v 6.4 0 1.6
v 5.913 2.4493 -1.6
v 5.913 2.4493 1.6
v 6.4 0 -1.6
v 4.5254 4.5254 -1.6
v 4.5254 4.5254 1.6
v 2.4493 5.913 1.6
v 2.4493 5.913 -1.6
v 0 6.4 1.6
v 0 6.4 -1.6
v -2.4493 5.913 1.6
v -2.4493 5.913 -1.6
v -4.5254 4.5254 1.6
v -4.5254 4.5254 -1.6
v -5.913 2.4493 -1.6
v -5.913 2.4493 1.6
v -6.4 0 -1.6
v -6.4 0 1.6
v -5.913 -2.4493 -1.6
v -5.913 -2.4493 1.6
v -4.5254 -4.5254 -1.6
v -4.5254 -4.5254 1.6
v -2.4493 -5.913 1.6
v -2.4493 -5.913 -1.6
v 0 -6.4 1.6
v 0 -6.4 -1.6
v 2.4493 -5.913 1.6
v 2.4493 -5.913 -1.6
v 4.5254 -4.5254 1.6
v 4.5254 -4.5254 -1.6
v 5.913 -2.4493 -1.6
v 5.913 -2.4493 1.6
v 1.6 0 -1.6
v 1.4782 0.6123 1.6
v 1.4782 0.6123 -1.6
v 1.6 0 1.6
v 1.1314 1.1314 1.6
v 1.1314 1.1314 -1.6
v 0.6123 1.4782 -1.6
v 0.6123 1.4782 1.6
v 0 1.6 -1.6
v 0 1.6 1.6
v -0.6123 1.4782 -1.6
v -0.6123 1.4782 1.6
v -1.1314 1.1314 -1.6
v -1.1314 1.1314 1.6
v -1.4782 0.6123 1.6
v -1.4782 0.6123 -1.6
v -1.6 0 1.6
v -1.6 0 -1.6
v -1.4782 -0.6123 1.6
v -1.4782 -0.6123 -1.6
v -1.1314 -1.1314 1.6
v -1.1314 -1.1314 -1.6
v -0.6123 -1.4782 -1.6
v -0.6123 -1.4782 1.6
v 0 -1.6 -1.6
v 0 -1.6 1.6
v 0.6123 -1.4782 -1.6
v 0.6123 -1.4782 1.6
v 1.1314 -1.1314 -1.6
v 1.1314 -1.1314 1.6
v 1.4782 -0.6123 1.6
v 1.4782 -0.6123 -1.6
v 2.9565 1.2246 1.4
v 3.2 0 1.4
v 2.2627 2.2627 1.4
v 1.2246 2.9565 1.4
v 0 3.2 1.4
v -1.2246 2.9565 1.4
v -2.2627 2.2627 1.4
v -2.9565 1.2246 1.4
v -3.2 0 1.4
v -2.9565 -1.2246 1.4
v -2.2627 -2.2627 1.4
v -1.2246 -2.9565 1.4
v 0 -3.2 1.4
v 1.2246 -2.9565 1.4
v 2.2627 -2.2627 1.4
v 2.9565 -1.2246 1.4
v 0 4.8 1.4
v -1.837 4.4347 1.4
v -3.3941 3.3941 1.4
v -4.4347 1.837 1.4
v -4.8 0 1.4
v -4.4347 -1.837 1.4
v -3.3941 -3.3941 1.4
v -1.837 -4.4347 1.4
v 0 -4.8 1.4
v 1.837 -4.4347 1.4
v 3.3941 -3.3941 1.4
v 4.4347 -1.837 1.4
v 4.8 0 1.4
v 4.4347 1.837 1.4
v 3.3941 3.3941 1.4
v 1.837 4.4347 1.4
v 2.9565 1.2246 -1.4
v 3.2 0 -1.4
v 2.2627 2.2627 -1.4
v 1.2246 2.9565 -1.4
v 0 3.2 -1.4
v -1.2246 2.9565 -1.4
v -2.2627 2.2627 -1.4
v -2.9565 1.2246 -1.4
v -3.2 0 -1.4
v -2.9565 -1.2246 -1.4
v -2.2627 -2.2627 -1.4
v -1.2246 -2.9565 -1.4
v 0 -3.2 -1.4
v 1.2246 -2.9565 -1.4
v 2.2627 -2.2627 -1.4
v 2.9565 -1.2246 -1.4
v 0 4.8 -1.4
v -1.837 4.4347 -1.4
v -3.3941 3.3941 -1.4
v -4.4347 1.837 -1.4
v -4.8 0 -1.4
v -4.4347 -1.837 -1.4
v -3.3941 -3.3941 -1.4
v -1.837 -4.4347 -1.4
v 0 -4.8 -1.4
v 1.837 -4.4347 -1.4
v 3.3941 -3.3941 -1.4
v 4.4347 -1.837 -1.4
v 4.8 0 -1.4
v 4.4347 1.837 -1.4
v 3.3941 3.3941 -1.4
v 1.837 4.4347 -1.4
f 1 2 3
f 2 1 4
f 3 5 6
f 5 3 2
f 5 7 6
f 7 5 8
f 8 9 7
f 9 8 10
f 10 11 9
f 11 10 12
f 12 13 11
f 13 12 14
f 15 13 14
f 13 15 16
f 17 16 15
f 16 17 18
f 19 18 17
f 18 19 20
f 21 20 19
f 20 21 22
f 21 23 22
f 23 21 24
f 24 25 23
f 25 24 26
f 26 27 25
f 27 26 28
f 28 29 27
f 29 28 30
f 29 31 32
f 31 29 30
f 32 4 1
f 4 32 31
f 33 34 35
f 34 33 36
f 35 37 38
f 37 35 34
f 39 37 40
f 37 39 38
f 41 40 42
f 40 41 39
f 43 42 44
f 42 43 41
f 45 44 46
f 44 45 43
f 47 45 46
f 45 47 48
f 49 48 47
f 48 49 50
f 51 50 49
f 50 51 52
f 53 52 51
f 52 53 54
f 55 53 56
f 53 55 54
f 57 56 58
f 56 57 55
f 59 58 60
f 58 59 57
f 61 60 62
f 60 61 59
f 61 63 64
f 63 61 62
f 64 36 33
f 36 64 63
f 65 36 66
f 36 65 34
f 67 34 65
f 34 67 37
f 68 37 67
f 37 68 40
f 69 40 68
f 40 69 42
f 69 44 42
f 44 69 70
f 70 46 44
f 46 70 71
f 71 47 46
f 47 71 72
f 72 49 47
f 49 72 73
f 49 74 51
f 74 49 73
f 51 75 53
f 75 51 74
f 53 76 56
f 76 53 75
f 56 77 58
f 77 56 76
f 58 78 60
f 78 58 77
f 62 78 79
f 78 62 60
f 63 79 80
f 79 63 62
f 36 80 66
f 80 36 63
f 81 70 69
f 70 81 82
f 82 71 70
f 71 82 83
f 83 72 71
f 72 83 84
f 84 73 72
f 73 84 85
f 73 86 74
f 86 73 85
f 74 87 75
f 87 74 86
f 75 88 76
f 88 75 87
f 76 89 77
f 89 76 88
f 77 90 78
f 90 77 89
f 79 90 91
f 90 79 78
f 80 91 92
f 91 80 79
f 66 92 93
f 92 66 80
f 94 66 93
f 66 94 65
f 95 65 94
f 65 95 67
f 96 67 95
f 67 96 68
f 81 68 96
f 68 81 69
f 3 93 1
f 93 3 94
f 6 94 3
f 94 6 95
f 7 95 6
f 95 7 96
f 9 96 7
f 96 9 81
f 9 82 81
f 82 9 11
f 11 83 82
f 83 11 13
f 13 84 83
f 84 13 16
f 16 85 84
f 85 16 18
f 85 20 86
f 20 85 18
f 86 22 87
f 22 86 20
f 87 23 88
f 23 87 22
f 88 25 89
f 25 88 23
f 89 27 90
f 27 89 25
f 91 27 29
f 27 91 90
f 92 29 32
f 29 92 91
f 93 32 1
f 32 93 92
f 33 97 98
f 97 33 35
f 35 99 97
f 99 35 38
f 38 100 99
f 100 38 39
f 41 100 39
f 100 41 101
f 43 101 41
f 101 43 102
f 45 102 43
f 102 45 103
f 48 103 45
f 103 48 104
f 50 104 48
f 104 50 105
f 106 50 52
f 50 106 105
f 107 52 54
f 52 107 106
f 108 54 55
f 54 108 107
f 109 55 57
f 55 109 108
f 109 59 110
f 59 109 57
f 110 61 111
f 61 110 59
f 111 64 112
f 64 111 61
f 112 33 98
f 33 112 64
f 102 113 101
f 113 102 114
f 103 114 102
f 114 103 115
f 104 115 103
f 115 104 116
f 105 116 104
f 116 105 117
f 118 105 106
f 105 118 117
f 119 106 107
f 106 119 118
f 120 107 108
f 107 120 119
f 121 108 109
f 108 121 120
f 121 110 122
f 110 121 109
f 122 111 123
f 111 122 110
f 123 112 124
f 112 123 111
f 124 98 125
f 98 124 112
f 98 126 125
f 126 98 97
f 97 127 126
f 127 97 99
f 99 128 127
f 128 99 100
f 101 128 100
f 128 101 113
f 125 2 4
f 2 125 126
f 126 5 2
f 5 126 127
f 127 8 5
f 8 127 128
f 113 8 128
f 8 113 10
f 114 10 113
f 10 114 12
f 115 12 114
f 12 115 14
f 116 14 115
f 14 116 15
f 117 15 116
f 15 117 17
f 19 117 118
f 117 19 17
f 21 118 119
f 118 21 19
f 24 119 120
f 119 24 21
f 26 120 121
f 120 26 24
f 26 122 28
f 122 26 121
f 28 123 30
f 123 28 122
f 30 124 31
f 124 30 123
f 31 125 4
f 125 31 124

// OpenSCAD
// file: ../p/4-4edge.scad
use <../lib.scad>
function ldraw_lib__4_4edge() = [
// 0 Circle 1.0
// 0 Name: 4-4edge.dat
// 0 Author: James Jessiman
// 0 !LDRAW_ORG Primitive UPDATE 2017-01
// 0 !LICENSE Licensed under CC BY 2.0 and CC BY 4.0 : see CAreadme.txt
// 
// 0 BFC CERTIFY CCW
  [0,"BFC","CERTIFY"],
  [0,"BFC","CCW"],
// 
// 0 !HISTORY 1998-12-15 [PTadmin] Official Update 1998-10
// 0 !HISTORY 2005-12-28 [PTadmin] Official Update 2005-01
// 0 !HISTORY 2007-06-24 [PTadmin] Header formatted for Contributor Agreement
// 0 !HISTORY 2008-07-01 [PTadmin] Official Update 2008-01
// 0 !HISTORY 2017-01-15 [Steffen] BFCed
// 0 !HISTORY 2017-12-30 [PTadmin] Official Update 2017-01
// 
// 
// 2 24 1 0 0 0.9239 0 0.3827
  [2,24,1,0,0,0.9239,0,0.3827],
// 2 24 0.9239 0 0.3827 0.7071 0 0.7071
  [2,24,0.9239,0,0.3827,0.7071,0,0.7071],
// 2 24 0.7071 0 0.7071 0.3827 0 0.9239
  [2,24,0.7071,0,0.7071,0.3827,0,0.9239],
// 2 24 0.3827 0 0.9239 0 0 1
  [2,24,0.3827,0,0.9239,0,0,1],
// 2 24 0 0 1 -0.3827 0 0.9239
  [2,24,0,0,1,-0.3827,0,0.9239],
// 2 24 -0.3827 0 0.9239 -0.7071 0 0.7071
  [2,24,-0.3827,0,0.9239,-0.7071,0,0.7071],
// 2 24 -0.7071 0 0.7071 -0.9239 0 0.3827
  [2,24,-0.7071,0,0.7071,-0.9239,0,0.3827],
// 2 24 -0.9239 0 0.3827 -1 0 -0
  [2,24,-0.9239,0,0.3827,-1,0,-0],
// 2 24 -1 0 -0 -0.9239 0 -0.3827
  [2,24,-1,0,-0,-0.9239,0,-0.3827],
// 2 24 -0.9239 0 -0.3827 -0.7071 0 -0.7071
  [2,24,-0.9239,0,-0.3827,-0.7071,0,-0.7071],
// 2 24 -0.7071 0 -0.7071 -0.3827 0 -0.9239
  [2,24,-0.7071,0,-0.7071,-0.3827,0,-0.9239],
// 2 24 -0.3827 0 -0.9239 0 0 -1
  [2,24,-0.3827,0,-0.9239,0,0,-1],
// 2 24 0 0 -1 0.3827 0 -0.9239
  [2,24,0,0,-1,0.3827,0,-0.9239],
// 2 24 0.3827 0 -0.9239 0.7071 0 -0.7071
  [2,24,0.3827,0,-0.9239,0.7071,0,-0.7071],
// 2 24 0.7071 0 -0.7071 0.9239 0 -0.3827
  [2,24,0.7071,0,-0.7071,0.9239,0,-0.3827],
// 2 24 0.9239 0 -0.3827 1 0 0
  [2,24,0.9239,0,-0.3827,1,0,0],
];
module ldraw_lib__4_4edge(step=0, col=false, unit=2/5, alt=false, line=0.2, solid=!$preview)
    makepoly(ldraw_lib__4_4edge(), step=step, col=col, unit=unit, alt=alt, line=line, solid=solid);
ldraw_lib__4_4edge(line=0.2);
// file: ../p/4-4cyli.scad
use <../lib.scad>
function ldraw_lib__4_4cyli() = [
// 0 Cylinder 1.0
// 0 Name: 4-4cyli.dat
// 0 Author: James Jessiman
// 0 !LDRAW_ORG Primitive UPDATE 2005-01
// 0 !LICENSE Licensed under CC BY 2.0 and CC BY 4.0 : see CAreadme.txt
// 
// 0 BFC CERTIFY CCW
  [0,"BFC","CERTIFY"],
  [0,"BFC","CCW"],
// 
// 0 !HISTORY 1998-12-15 [PTadmin] Official Update 1998-10
// 0 !HISTORY 2002-03-23 [sbliss] Added BFC statement; merged headers from files in distributions LDraw 0.27 and Complete.
// 0 !HISTORY 2002-04-25 [PTadmin] Official Update 2002-02
// 0 !HISTORY 2004-12-14 [guyvivan] BFC CCW
// 0 !HISTORY 2005-12-28 [PTadmin] Official Update 2005-01
// 0 !HISTORY 2007-06-24 [PTadmin] Header formatted for Contributor Agreement
// 0 !HISTORY 2008-07-01 [PTadmin] Official Update 2008-01
// 
// 
// 4 16 1 1 0 0.9239 1 0.3827 0.9239 0 0.3827 1 0 0
  [4,16,1,1,0,0.9239,1,0.3827,0.9239,0,0.3827,1,0,0],
// 5 24 1 0 0 1 1 0 0.9239 0 0.3827 0.9239 0 -0.3827
  [5,24,1,0,0,1,1,0,0.9239,0,0.3827,0.9239,0,-0.3827],
// 4 16 0.9239 1 0.3827 0.7071 1 0.7071 0.7071 0 0.7071 0.9239 0 0.3827
  [4,16,0.9239,1,0.3827,0.7071,1,0.7071,0.7071,0,0.7071,0.9239,0,0.3827],
// 5 24 0.9239 0 0.3827 0.9239 1 0.3827 0.7071 0 0.7071 1 0 0
  [5,24,0.9239,0,0.3827,0.9239,1,0.3827,0.7071,0,0.7071,1,0,0],
// 4 16 0.7071 1 0.7071 0.3827 1 0.9239 0.3827 0 0.9239 0.7071 0 0.7071
  [4,16,0.7071,1,0.7071,0.3827,1,0.9239,0.3827,0,0.9239,0.7071,0,0.7071],
// 5 24 0.7071 0 0.7071 0.7071 1 0.7071 0.3827 0 0.9239 0.9239 0 0.3827
  [5,24,0.7071,0,0.7071,0.7071,1,0.7071,0.3827,0,0.9239,0.9239,0,0.3827],
// 4 16 0.3827 1 0.9239 0 1 1 0 0 1 0.3827 0 0.9239
  [4,16,0.3827,1,0.9239,0,1,1,0,0,1,0.3827,0,0.9239],
// 5 24 0.3827 0 0.9239 0.3827 1 0.9239 0 0 1 0.7071 0 0.7071
  [5,24,0.3827,0,0.9239,0.3827,1,0.9239,0,0,1,0.7071,0,0.7071],
// 4 16 0 1 1 -0.3827 1 0.9239 -0.3827 0 0.9239 0 0 1
  [4,16,0,1,1,-0.3827,1,0.9239,-0.3827,0,0.9239,0,0,1],
// 5 24 0 0 1 0 1 1 -0.3827 0 0.9239 0.3827 0 0.9239
  [5,24,0,0,1,0,1,1,-0.3827,0,0.9239,0.3827,0,0.9239],
// 4 16 -0.3827 1 0.9239 -0.7071 1 0.7071 -0.7071 0 0.7071 -0.3827 0 0.9239
  [4,16,-0.3827,1,0.9239,-0.7071,1,0.7071,-0.7071,0,0.7071,-0.3827,0,0.9239],
// 5 24 -0.3827 0 0.9239 -0.3827 1 0.9239 -0.7071 0 0.7071 0 0 1
  [5,24,-0.3827,0,0.9239,-0.3827,1,0.9239,-0.7071,0,0.7071,0,0,1],
// 4 16 -0.7071 1 0.7071 -0.9239 1 0.3827 -0.9239 0 0.3827 -0.7071 0 0.7071
  [4,16,-0.7071,1,0.7071,-0.9239,1,0.3827,-0.9239,0,0.3827,-0.7071,0,0.7071],
// 5 24 -0.7071 0 0.7071 -0.7071 1 0.7071 -0.9239 0 0.3827 -0.3827 0 0.9239
  [5,24,-0.7071,0,0.7071,-0.7071,1,0.7071,-0.9239,0,0.3827,-0.3827,0,0.9239],
// 4 16 -0.9239 1 0.3827 -1 1 0 -1 0 0 -0.9239 0 0.3827
  [4,16,-0.9239,1,0.3827,-1,1,0,-1,0,0,-0.9239,0,0.3827],
// 5 24 -0.9239 0 0.3827 -0.9239 1 0.3827 -1 0 0 -0.7071 0 0.7071
  [5,24,-0.9239,0,0.3827,-0.9239,1,0.3827,-1,0,0,-0.7071,0,0.7071],
// 4 16 -1 1 0 -0.9239 1 -0.3827 -0.9239 0 -0.3827 -1 0 0
  [4,16,-1,1,0,-0.9239,1,-0.3827,-0.9239,0,-0.3827,-1,0,0],
// 5 24 -1 0 0 -1 1 0 -0.9239 0 -0.3827 -0.9239 0 0.3827
  [5,24,-1,0,0,-1,1,0,-0.9239,0,-0.3827,-0.9239,0,0.3827],
// 4 16 -0.9239 1 -0.3827 -0.7071 1 -0.7071 -0.7071 0 -0.7071 -0.9239 0 -0.3827
  [4,16,-0.9239,1,-0.3827,-0.7071,1,-0.7071,-0.7071,0,-0.7071,-0.9239,0,-0.3827],
// 5 24 -0.9239 0 -0.3827 -0.9239 1 -0.3827 -0.7071 0 -0.7071 -1 0 0
  [5,24,-0.9239,0,-0.3827,-0.9239,1,-0.3827,-0.7071,0,-0.7071,-1,0,0],
// 4 16 -0.7071 1 -0.7071 -0.3827 1 -0.9239 -0.3827 0 -0.9239 -0.7071 0 -0.7071
  [4,16,-0.7071,1,-0.7071,-0.3827,1,-0.9239,-0.3827,0,-0.9239,-0.7071,0,-0.7071],
// 5 24 -0.7071 0 -0.7071 -0.7071 1 -0.7071 -0.3827 0 -0.9239 -0.9239 0 -0.3827
  [5,24,-0.7071,0,-0.7071,-0.7071,1,-0.7071,-0.3827,0,-0.9239,-0.9239,0,-0.3827],
// 4 16 -0.3827 1 -0.9239 0 1 -1 0 0 -1 -0.3827 0 -0.9239
  [4,16,-0.3827,1,-0.9239,0,1,-1,0,0,-1,-0.3827,0,-0.9239],
// 5 24 -0.3827 0 -0.9239 -0.3827 1 -0.9239 0 0 -1 -0.7071 0 -0.7071
  [5,24,-0.3827,0,-0.9239,-0.3827,1,-0.9239,0,0,-1,-0.7071,0,-0.7071],
// 4 16 0 1 -1 0.3827 1 -0.9239 0.3827 0 -0.9239 0 0 -1
  [4,16,0,1,-1,0.3827,1,-0.9239,0.3827,0,-0.9239,0,0,-1],
// 5 24 0 0 -1 0 1 -1 0.3827 0 -0.9239 -0.3827 0 -0.9239
  [5,24,0,0,-1,0,1,-1,0.3827,0,-0.9239,-0.3827,0,-0.9239],
// 4 16 0.3827 1 -0.9239 0.7071 1 -0.7071 0.7071 0 -0.7071 0.3827 0 -0.9239
  [4,16,0.3827,1,-0.9239,0.7071,1,-0.7071,0.7071,0,-0.7071,0.3827,0,-0.9239],
// 5 24 0.3827 0 -0.9239 0.3827 1 -0.9239 0.7071 0 -0.7071 0 0 -1
  [5,24,0.3827,0,-0.9239,0.3827,1,-0.9239,0.7071,0,-0.7071,0,0,-1],
// 4 16 0.7071 1 -0.7071 0.9239 1 -0.3827 0.9239 0 -0.3827 0.7071 0 -0.7071
  [4,16,0.7071,1,-0.7071,0.9239,1,-0.3827,0.9239,0,-0.3827,0.7071,0,-0.7071],
// 5 24 0.7071 0 -0.7071 0.7071 1 -0.7071 0.9239 0 -0.3827 0.3827 0 -0.9239
  [5,24,0.7071,0,-0.7071,0.7071,1,-0.7071,0.9239,0,-0.3827,0.3827,0,-0.9239],
// 4 16 0.9239 1 -0.3827 1 1 0 1 0 0 0.9239 0 -0.3827
  [4,16,0.9239,1,-0.3827,1,1,0,1,0,0,0.9239,0,-0.3827],
// 5 24 0.9239 0 -0.3827 0.9239 1 -0.3827 1 0 0 0.7071 0 -0.7071
  [5,24,0.9239,0,-0.3827,0.9239,1,-0.3827,1,0,0,0.7071,0,-0.7071],
// 0
];
module ldraw_lib__4_4cyli(step=0, col=false, unit=2/5, alt=false, line=0.2, solid=!$preview)
    makepoly(ldraw_lib__4_4cyli(), step=step, col=col, unit=unit, alt=alt, line=line, solid=solid);
ldraw_lib__4_4cyli(line=0.2);
// file: ../p/4-4ring2.scad
use <../lib.scad>
function ldraw_lib__4_4ring2() = [
// 0 Ring  2 x 1.0
// 0 Name: 4-4ring2.dat
// 0 Author: James Jessiman
// 0 !LDRAW_ORG Primitive UPDATE 2009-01
// 0 !LICENSE Licensed under CC BY 2.0 and CC BY 4.0 : see CAreadme.txt
// 
// 0 BFC CERTIFY CCW
  [0,"BFC","CERTIFY"],
  [0,"BFC","CCW"],
// 
// 0 !HISTORY 1998-12-15 [PTadmin] Official Update 1998-10
// 0 !HISTORY 2002-04-05 [hafhead] Added BFC statement
// 0 !HISTORY 2002-04-25 [PTadmin] Official Update 2002-02
// 0 !HISTORY 2007-06-24 [PTadmin] Header formatted for Contributor Agreement
// 0 !HISTORY 2008-07-01 [PTadmin] Official Update 2008-01
// 0 !HISTORY 2008-08-26 [cwdee] Switch polygon winding and rename
// 0 !HISTORY 2009-05-02 [PTadmin] Official Update 2009-01
// 
// 
// 4 16 -1.1481 0 2.7717 -0.7654 0 1.8478 0 0 2 0 0 3
  [4,16,-1.1481,0,2.7717,-0.7654,0,1.8478,0,0,2,0,0,3],
// 4 16 -2.1213 0 2.1213 -1.4142 0 1.4142 -0.7654 0 1.8478 -1.1481 0 2.7717
  [4,16,-2.1213,0,2.1213,-1.4142,0,1.4142,-0.7654,0,1.8478,-1.1481,0,2.7717],
// 4 16 -2.7717 0 1.1481 -1.8478 0 0.7654 -1.4142 0 1.4142 -2.1213 0 2.1213
  [4,16,-2.7717,0,1.1481,-1.8478,0,0.7654,-1.4142,0,1.4142,-2.1213,0,2.1213],
// 4 16 -3 0 0 -2 0 0 -1.8478 0 0.7654 -2.7717 0 1.1481
  [4,16,-3,0,0,-2,0,0,-1.8478,0,0.7654,-2.7717,0,1.1481],
// 4 16 -2.7717 0 -1.1481 -1.8478 0 -0.7654 -2 0 0 -3 0 0
  [4,16,-2.7717,0,-1.1481,-1.8478,0,-0.7654,-2,0,0,-3,0,0],
// 4 16 -2.1213 0 -2.1213 -1.4142 0 -1.4142 -1.8478 0 -0.7654 -2.7717 0 -1.1481
  [4,16,-2.1213,0,-2.1213,-1.4142,0,-1.4142,-1.8478,0,-0.7654,-2.7717,0,-1.1481],
// 4 16 -1.1481 0 -2.7717 -0.7654 0 -1.8478 -1.4142 0 -1.4142 -2.1213 0 -2.1213
  [4,16,-1.1481,0,-2.7717,-0.7654,0,-1.8478,-1.4142,0,-1.4142,-2.1213,0,-2.1213],
// 4 16 0 0 -3 0 0 -2 -0.7654 0 -1.8478 -1.1481 0 -2.7717
  [4,16,0,0,-3,0,0,-2,-0.7654,0,-1.8478,-1.1481,0,-2.7717],
// 4 16 1.1481 0 -2.7717 0.7654 0 -1.8478 0 0 -2 0 0 -3
  [4,16,1.1481,0,-2.7717,0.7654,0,-1.8478,0,0,-2,0,0,-3],
// 4 16 2.1213 0 -2.1213 1.4142 0 -1.4142 0.7654 0 -1.8478 1.1481 0 -2.7717
  [4,16,2.1213,0,-2.1213,1.4142,0,-1.4142,0.7654,0,-1.8478,1.1481,0,-2.7717],
// 4 16 2.7717 0 -1.1481 1.8478 0 -0.7654 1.4142 0 -1.4142 2.1213 0 -2.1213
  [4,16,2.7717,0,-1.1481,1.8478,0,-0.7654,1.4142,0,-1.4142,2.1213,0,-2.1213],
// 4 16 3 0 0 2 0 0 1.8478 0 -0.7654 2.7717 0 -1.1481
  [4,16,3,0,0,2,0,0,1.8478,0,-0.7654,2.7717,0,-1.1481],
// 4 16 2.7717 0 1.1481 1.8478 0 0.7654 2 0 0 3 0 0
  [4,16,2.7717,0,1.1481,1.8478,0,0.7654,2,0,0,3,0,0],
// 4 16 2.1213 0 2.1213 1.4142 0 1.4142 1.8478 0 0.7654 2.7717 0 1.1481
  [4,16,2.1213,0,2.1213,1.4142,0,1.4142,1.8478,0,0.7654,2.7717,0,1.1481],
// 4 16 1.1481 0 2.7717 0.7654 0 1.8478 1.4142 0 1.4142 2.1213 0 2.1213
  [4,16,1.1481,0,2.7717,0.7654,0,1.8478,1.4142,0,1.4142,2.1213,0,2.1213],
// 4 16 0 0 3 0 0 2 0.7654 0 1.8478 1.1481 0 2.7717
  [4,16,0,0,3,0,0,2,0.7654,0,1.8478,1.1481,0,2.7717],
// 0
];
module ldraw_lib__4_4ring2(step=0, col=false, unit=2/5, alt=false, line=0.2, solid=!$preview)
    makepoly(ldraw_lib__4_4ring2(), step=step, col=col, unit=unit, alt=alt, line=line, solid=solid);
ldraw_lib__4_4ring2(line=0.2);
// file: ../p/4-4cylo.scad
use <../lib.scad>
use <4-4cyli.scad>
use <4-4edge.scad>
function ldraw_lib__4_4cylo() = [
// 0 Cylinder Open 1.0
// 0 Name: 4-4cylo.dat
// 0 Author: Mark Kennedy [mkennedy]
// 0 !LDRAW_ORG Primitive UPDATE 2010-01
// 0 !LICENSE Licensed under CC BY 2.0 and CC BY 4.0 : see CAreadme.txt
// 
// 0 BFC CERTIFY CCW
  [0,"BFC","CERTIFY"],
  [0,"BFC","CCW"],
// 
// 0 !HISTORY 2010-04-05 [PTadmin] Official Update 2010-01
// 
// 
// 1 16 0 0 0 1 0 0 0 1 0 0 0 1 4-4edge.dat
  [1,16,0,0,0,1,0,0,0,1,0,0,0,1, ldraw_lib__4_4edge()],
// 1 16 0 1 0 1 0 0 0 1 0 0 0 1 4-4edge.dat
  [1,16,0,1,0,1,0,0,0,1,0,0,0,1, ldraw_lib__4_4edge()],
// 1 16 0 0 0 1 0 0 0 1 0 0 0 1 4-4cyli.dat
  [1,16,0,0,0,1,0,0,0,1,0,0,0,1, ldraw_lib__4_4cyli()],
// 0
];
module ldraw_lib__4_4cylo(step=0, col=false, unit=2/5, alt=false, line=0.2, solid=!$preview)
    makepoly(ldraw_lib__4_4cylo(), step=step, col=col, unit=unit, alt=alt, line=line, solid=solid);
ldraw_lib__4_4cylo(line=0.2);
// file: ../p/4-4con3.scad
use <../lib.scad>
function ldraw_lib__4_4con3() = [
// 0 Cone  3 x 1.0
// 0 Name: 4-4con3.dat
// 0 Author: Niels Karsdorp [nielsk]
// 0 !LDRAW_ORG Primitive UPDATE 2003-02
// 0 !LICENSE Licensed under CC BY 2.0 and CC BY 4.0 : see CAreadme.txt
// 
// 0 BFC CERTIFY CCW
  [0,"BFC","CERTIFY"],
  [0,"BFC","CCW"],
// 
// 0 !HISTORY 2003-08-01 [PTadmin] Official Update 2003-02
// 0 !HISTORY 2007-06-24 [PTadmin] Header formatted for Contributor Agreement
// 0 !HISTORY 2008-07-01 [PTadmin] Official Update 2008-01
// 
// 
// 5 24 3 1 0 4 0 0 2.7717 1 1.1481 2.7717 1 -1.1481
  [5,24,3,1,0,4,0,0,2.7717,1,1.1481,2.7717,1,-1.1481],
// 5 24 2.7717 1 1.1481 3.6956 0 1.5308 2.1213 1 2.1213 3 1 0
  [5,24,2.7717,1,1.1481,3.6956,0,1.5308,2.1213,1,2.1213,3,1,0],
// 5 24 2.1213 1 2.1213 2.8284 0 2.8284 1.1481 1 2.7717 2.7717 1 1.1481
  [5,24,2.1213,1,2.1213,2.8284,0,2.8284,1.1481,1,2.7717,2.7717,1,1.1481],
// 5 24 1.1481 1 2.7717 1.5308 0 3.6956 0 1 3 2.1213 1 2.1213
  [5,24,1.1481,1,2.7717,1.5308,0,3.6956,0,1,3,2.1213,1,2.1213],
// 5 24 0 1 3 0 0 4 -1.1481 1 2.7717 1.1481 1 2.7717
  [5,24,0,1,3,0,0,4,-1.1481,1,2.7717,1.1481,1,2.7717],
// 5 24 -1.1481 1 2.7717 -1.5308 0 3.6956 -2.1213 1 2.1213 0 1 3
  [5,24,-1.1481,1,2.7717,-1.5308,0,3.6956,-2.1213,1,2.1213,0,1,3],
// 5 24 -2.1213 1 2.1213 -2.8284 0 2.8284 -2.7717 1 1.1481 -1.1481 1 2.7717
  [5,24,-2.1213,1,2.1213,-2.8284,0,2.8284,-2.7717,1,1.1481,-1.1481,1,2.7717],
// 5 24 -2.7717 1 1.1481 -3.6956 0 1.5308 -3 1 0 -2.1213 1 2.1213
  [5,24,-2.7717,1,1.1481,-3.6956,0,1.5308,-3,1,0,-2.1213,1,2.1213],
// 5 24 -3 1 0 -4 0 0 -2.7717 1 -1.1481 -2.7717 1 1.1481
  [5,24,-3,1,0,-4,0,0,-2.7717,1,-1.1481,-2.7717,1,1.1481],
// 5 24 -2.7717 1 -1.1481 -3.6956 0 -1.5308 -2.1213 1 -2.1213 -3 1 0
  [5,24,-2.7717,1,-1.1481,-3.6956,0,-1.5308,-2.1213,1,-2.1213,-3,1,0],
// 5 24 -2.1213 1 -2.1213 -2.8284 0 -2.8284 -1.1481 1 -2.7717 -2.7717 1 -1.1481
  [5,24,-2.1213,1,-2.1213,-2.8284,0,-2.8284,-1.1481,1,-2.7717,-2.7717,1,-1.1481],
// 5 24 -1.1481 1 -2.7717 -1.5308 0 -3.6956 0 1 -3 -2.1213 1 -2.1213
  [5,24,-1.1481,1,-2.7717,-1.5308,0,-3.6956,0,1,-3,-2.1213,1,-2.1213],
// 5 24 0 1 -3 0 0 -4 1.1481 1 -2.7717 -1.1481 1 -2.7717
  [5,24,0,1,-3,0,0,-4,1.1481,1,-2.7717,-1.1481,1,-2.7717],
// 5 24 1.1481 1 -2.7717 1.5308 0 -3.6956 2.1213 1 -2.1213 0 1 -3
  [5,24,1.1481,1,-2.7717,1.5308,0,-3.6956,2.1213,1,-2.1213,0,1,-3],
// 5 24 2.1213 1 -2.1213 2.8284 0 -2.8284 2.7717 1 -1.1481 1.1481 1 -2.7717
  [5,24,2.1213,1,-2.1213,2.8284,0,-2.8284,2.7717,1,-1.1481,1.1481,1,-2.7717],
// 5 24 2.7717 1 -1.1481 3.6956 0 -1.5308 3 1 0 2.1213 1 -2.1213
  [5,24,2.7717,1,-1.1481,3.6956,0,-1.5308,3,1,0,2.1213,1,-2.1213],
// 
// 4 16 3 1 0 2.7717 1 1.1481 3.6956 0 1.5308 4 0 0
  [4,16,3,1,0,2.7717,1,1.1481,3.6956,0,1.5308,4,0,0],
// 4 16 2.7717 1 1.1481 2.1213 1 2.1213 2.8284 0 2.8284 3.6956 0 1.5308
  [4,16,2.7717,1,1.1481,2.1213,1,2.1213,2.8284,0,2.8284,3.6956,0,1.5308],
// 4 16 2.1213 1 2.1213 1.1481 1 2.7717 1.5308 0 3.6956 2.8284 0 2.8284
  [4,16,2.1213,1,2.1213,1.1481,1,2.7717,1.5308,0,3.6956,2.8284,0,2.8284],
// 4 16 1.1481 1 2.7717 0 1 3 0 0 4 1.5308 0 3.6956
  [4,16,1.1481,1,2.7717,0,1,3,0,0,4,1.5308,0,3.6956],
// 4 16 0 1 3 -1.1481 1 2.7717 -1.5308 0 3.6956 0 0 4
  [4,16,0,1,3,-1.1481,1,2.7717,-1.5308,0,3.6956,0,0,4],
// 4 16 -1.1481 1 2.7717 -2.1213 1 2.1213 -2.8284 0 2.8284 -1.5308 0 3.6956
  [4,16,-1.1481,1,2.7717,-2.1213,1,2.1213,-2.8284,0,2.8284,-1.5308,0,3.6956],
// 4 16 -2.1213 1 2.1213 -2.7717 1 1.1481 -3.6956 0 1.5308 -2.8284 0 2.8284
  [4,16,-2.1213,1,2.1213,-2.7717,1,1.1481,-3.6956,0,1.5308,-2.8284,0,2.8284],
// 4 16 -2.7717 1 1.1481 -3 1 0 -4 0 0 -3.6956 0 1.5308
  [4,16,-2.7717,1,1.1481,-3,1,0,-4,0,0,-3.6956,0,1.5308],
// 4 16 -3 1 0 -2.7717 1 -1.1481 -3.6956 0 -1.5308 -4 0 0
  [4,16,-3,1,0,-2.7717,1,-1.1481,-3.6956,0,-1.5308,-4,0,0],
// 4 16 -2.7717 1 -1.1481 -2.1213 1 -2.1213 -2.8284 0 -2.8284 -3.6956 0 -1.5308
  [4,16,-2.7717,1,-1.1481,-2.1213,1,-2.1213,-2.8284,0,-2.8284,-3.6956,0,-1.5308],
// 4 16 -2.1213 1 -2.1213 -1.1481 1 -2.7717 -1.5308 0 -3.6956 -2.8284 0 -2.8284
  [4,16,-2.1213,1,-2.1213,-1.1481,1,-2.7717,-1.5308,0,-3.6956,-2.8284,0,-2.8284],
// 4 16 -1.1481 1 -2.7717 0 1 -3 0 0 -4 -1.5308 0 -3.6956
  [4,16,-1.1481,1,-2.7717,0,1,-3,0,0,-4,-1.5308,0,-3.6956],
// 4 16 0 1 -3 1.1481 1 -2.7717 1.5308 0 -3.6956 0 0 -4
  [4,16,0,1,-3,1.1481,1,-2.7717,1.5308,0,-3.6956,0,0,-4],
// 4 16 1.1481 1 -2.7717 2.1213 1 -2.1213 2.8284 0 -2.8284 1.5308 0 -3.6956
  [4,16,1.1481,1,-2.7717,2.1213,1,-2.1213,2.8284,0,-2.8284,1.5308,0,-3.6956],
// 4 16 2.1213 1 -2.1213 2.7717 1 -1.1481 3.6956 0 -1.5308 2.8284 0 -2.8284
  [4,16,2.1213,1,-2.1213,2.7717,1,-1.1481,3.6956,0,-1.5308,2.8284,0,-2.8284],
// 4 16 2.7717 1 -1.1481 3 1 0 4 0 0 3.6956 0 -1.5308
  [4,16,2.7717,1,-1.1481,3,1,0,4,0,0,3.6956,0,-1.5308],
// 
// 0
// 
];
module ldraw_lib__4_4con3(step=0, col=false, unit=2/5, alt=false, line=0.2, solid=!$preview)
    makepoly(ldraw_lib__4_4con3(), step=step, col=col, unit=unit, alt=alt, line=line, solid=solid);
ldraw_lib__4_4con3(line=0.2);
// file: ../p/4-4con1.scad
use <../lib.scad>
function ldraw_lib__4_4con1() = [
// 0 Cone  1 x 1.0
// 0 Name: 4-4con1.dat
// 0 Author: Steve Bliss [sbliss]
// 0 !LDRAW_ORG Primitive UPDATE 2012-01
// 0 !LICENSE Licensed under CC BY 2.0 and CC BY 4.0 : see CAreadme.txt
// 
// 0 BFC CERTIFY CCW
  [0,"BFC","CERTIFY"],
  [0,"BFC","CCW"],
// 
// 0 !HISTORY 1999-08-19 [sbliss] Renamed 4-4con12.dat to 4-4con1.dat, Moved all conditional lines before quads
// 0 !HISTORY 2000-05-07 [PTadmin] Official Update 2000-01
// 0 !HISTORY 2002-12-11 [cwdee] Standardised title and made BFC compliant
// 0 !HISTORY 2003-08-01 [PTadmin] Official Update 2003-02
// 0 !HISTORY 2007-06-24 [PTadmin] Header formatted for Contributor Agreement
// 0 !HISTORY 2008-07-01 [PTadmin] Official Update 2008-01
// 0 !HISTORY 2012-02-16 [Philo] Changed to CCW, reordered
// 0 !HISTORY 2012-03-30 [PTadmin] Official Update 2012-01
// 
// 
// 5 24 1 1 0 2 0 0 0.9239 1 -0.3827 0.9239 1 0.3827
  [5,24,1,1,0,2,0,0,0.9239,1,-0.3827,0.9239,1,0.3827],
// 5 24 0.9239 1 0.3827 1.8478 0 0.7654 1 1 0 0.7071 1 0.7071
  [5,24,0.9239,1,0.3827,1.8478,0,0.7654,1,1,0,0.7071,1,0.7071],
// 5 24 0.7071 1 0.7071 1.4142 0 1.4142 0.9239 1 0.3827 0.3827 1 0.9239
  [5,24,0.7071,1,0.7071,1.4142,0,1.4142,0.9239,1,0.3827,0.3827,1,0.9239],
// 5 24 0.3827 1 0.9239 0.7654 0 1.8478 0.7071 1 0.7071 0 1 1
  [5,24,0.3827,1,0.9239,0.7654,0,1.8478,0.7071,1,0.7071,0,1,1],
// 5 24 0 1 1 0 0 2 0.3827 1 0.9239 -0.3827 1 0.9239
  [5,24,0,1,1,0,0,2,0.3827,1,0.9239,-0.3827,1,0.9239],
// 5 24 -0.3827 1 0.9239 -0.7654 0 1.8478 0 1 1 -0.7071 1 0.7071
  [5,24,-0.3827,1,0.9239,-0.7654,0,1.8478,0,1,1,-0.7071,1,0.7071],
// 5 24 -0.7071 1 0.7071 -1.4142 0 1.4142 -0.3827 1 0.9239 -0.9239 1 0.3827
  [5,24,-0.7071,1,0.7071,-1.4142,0,1.4142,-0.3827,1,0.9239,-0.9239,1,0.3827],
// 5 24 -0.9239 1 0.3827 -1.8478 0 0.7654 -0.7071 1 0.7071 -1 1 0
  [5,24,-0.9239,1,0.3827,-1.8478,0,0.7654,-0.7071,1,0.7071,-1,1,0],
// 5 24 -1 1 0 -2 0 0 -0.9239 1 0.3827 -0.9239 1 -0.3827
  [5,24,-1,1,0,-2,0,0,-0.9239,1,0.3827,-0.9239,1,-0.3827],
// 5 24 -0.9239 1 -0.3827 -1.8478 0 -0.7654 -1 1 0 -0.7071 1 -0.7071
  [5,24,-0.9239,1,-0.3827,-1.8478,0,-0.7654,-1,1,0,-0.7071,1,-0.7071],
// 5 24 -0.7071 1 -0.7071 -1.4142 0 -1.4142 -0.9239 1 -0.3827 -0.3827 1 -0.9239
  [5,24,-0.7071,1,-0.7071,-1.4142,0,-1.4142,-0.9239,1,-0.3827,-0.3827,1,-0.9239],
// 5 24 -0.3827 1 -0.9239 -0.7654 0 -1.8478 -0.7071 1 -0.7071 0 1 -1
  [5,24,-0.3827,1,-0.9239,-0.7654,0,-1.8478,-0.7071,1,-0.7071,0,1,-1],
// 5 24 0 1 -1 0 0 -2 -0.3827 1 -0.9239 0.3827 1 -0.9239
  [5,24,0,1,-1,0,0,-2,-0.3827,1,-0.9239,0.3827,1,-0.9239],
// 5 24 0.3827 1 -0.9239 0.7654 0 -1.8478 0 1 -1 0.7071 1 -0.7071
  [5,24,0.3827,1,-0.9239,0.7654,0,-1.8478,0,1,-1,0.7071,1,-0.7071],
// 5 24 0.7071 1 -0.7071 1.4142 0 -1.4142 0.3827 1 -0.9239 0.9239 1 -0.3827
  [5,24,0.7071,1,-0.7071,1.4142,0,-1.4142,0.3827,1,-0.9239,0.9239,1,-0.3827],
// 5 24 0.9239 1 -0.3827 1.8478 0 -0.7654 0.7071 1 -0.7071 1 1 0
  [5,24,0.9239,1,-0.3827,1.8478,0,-0.7654,0.7071,1,-0.7071,1,1,0],
// 
// 4 16 2 0 0 1 1 0 0.9239 1 0.3827 1.8478 0 0.7654
  [4,16,2,0,0,1,1,0,0.9239,1,0.3827,1.8478,0,0.7654],
// 4 16 1.8478 0 0.7654 0.9239 1 0.3827 0.7071 1 0.7071 1.4142 0 1.4142
  [4,16,1.8478,0,0.7654,0.9239,1,0.3827,0.7071,1,0.7071,1.4142,0,1.4142],
// 4 16 1.4142 0 1.4142 0.7071 1 0.7071 0.3827 1 0.9239 0.7654 0 1.8478
  [4,16,1.4142,0,1.4142,0.7071,1,0.7071,0.3827,1,0.9239,0.7654,0,1.8478],
// 4 16 0.7654 0 1.8478 0.3827 1 0.9239 0 1 1 0 0 2
  [4,16,0.7654,0,1.8478,0.3827,1,0.9239,0,1,1,0,0,2],
// 4 16 0 0 2 0 1 1 -0.3827 1 0.9239 -0.7654 0 1.8478
  [4,16,0,0,2,0,1,1,-0.3827,1,0.9239,-0.7654,0,1.8478],
// 4 16 -0.7654 0 1.8478 -0.3827 1 0.9239 -0.7071 1 0.7071 -1.4142 0 1.4142
  [4,16,-0.7654,0,1.8478,-0.3827,1,0.9239,-0.7071,1,0.7071,-1.4142,0,1.4142],
// 4 16 -1.4142 0 1.4142 -0.7071 1 0.7071 -0.9239 1 0.3827 -1.8478 0 0.7654
  [4,16,-1.4142,0,1.4142,-0.7071,1,0.7071,-0.9239,1,0.3827,-1.8478,0,0.7654],
// 4 16 -1.8478 0 0.7654 -0.9239 1 0.3827 -1 1 0 -2 0 0
  [4,16,-1.8478,0,0.7654,-0.9239,1,0.3827,-1,1,0,-2,0,0],
// 4 16 -2 0 0 -1 1 0 -0.9239 1 -0.3827 -1.8478 0 -0.7654
  [4,16,-2,0,0,-1,1,0,-0.9239,1,-0.3827,-1.8478,0,-0.7654],
// 4 16 -1.8478 0 -0.7654 -0.9239 1 -0.3827 -0.7071 1 -0.7071 -1.4142 0 -1.4142
  [4,16,-1.8478,0,-0.7654,-0.9239,1,-0.3827,-0.7071,1,-0.7071,-1.4142,0,-1.4142],
// 4 16 -1.4142 0 -1.4142 -0.7071 1 -0.7071 -0.3827 1 -0.9239 -0.7654 0 -1.8478
  [4,16,-1.4142,0,-1.4142,-0.7071,1,-0.7071,-0.3827,1,-0.9239,-0.7654,0,-1.8478],
// 4 16 -0.7654 0 -1.8478 -0.3827 1 -0.9239 0 1 -1 0 0 -2
  [4,16,-0.7654,0,-1.8478,-0.3827,1,-0.9239,0,1,-1,0,0,-2],
// 4 16 0 0 -2 0 1 -1 0.3827 1 -0.9239 0.7654 0 -1.8478
  [4,16,0,0,-2,0,1,-1,0.3827,1,-0.9239,0.7654,0,-1.8478],
// 4 16 0.7654 0 -1.8478 0.3827 1 -0.9239 0.7071 1 -0.7071 1.4142 0 -1.4142
  [4,16,0.7654,0,-1.8478,0.3827,1,-0.9239,0.7071,1,-0.7071,1.4142,0,-1.4142],
// 4 16 1.4142 0 -1.4142 0.7071 1 -0.7071 0.9239 1 -0.3827 1.8478 0 -0.7654
  [4,16,1.4142,0,-1.4142,0.7071,1,-0.7071,0.9239,1,-0.3827,1.8478,0,-0.7654],
// 4 16 1.8478 0 -0.7654 0.9239 1 -0.3827 1 1 0 2 0 0
  [4,16,1.8478,0,-0.7654,0.9239,1,-0.3827,1,1,0,2,0,0],
];
module ldraw_lib__4_4con1(step=0, col=false, unit=2/5, alt=false, line=0.2, solid=!$preview)
    makepoly(ldraw_lib__4_4con1(), step=step, col=col, unit=unit, alt=alt, line=line, solid=solid);
ldraw_lib__4_4con1(line=0.2);
// main file
use <../lib.scad>
use <../p/4-4con1.scad>
use <../p/4-4con3.scad>
use <../p/4-4cylo.scad>
use <../p/4-4ring2.scad>
function ldraw_lib__53993() = [
// 0 Disc  1.6 x  1.6 with Bar Hole
// 0 Name: 53993.dat
// 0 Author: Philippe Hurbain [Philo]
// 0 !LDRAW_ORG Part UPDATE 2019-03
// 0 !LICENSE Licensed under CC BY 2.0 and CC BY 4.0 : see CAreadme.txt
// 
// 0 BFC CERTIFY CCW
  [0,"BFC","CERTIFY"],
  [0,"BFC","CCW"],
// 
// 0 !CATEGORY Cylinder
// 0 !KEYWORDS Projectile, Weapon
// 
// 0 !HISTORY 2019-12-27 [PTadmin] Official Update 2019-03
// 
// 
// 1 16 0 -4 0 16 0 0 0 8 0 0 0 16 4-4cylo.dat
  [1,16,0,-4,0,16,0,0,0,8,0,0,0,16, ldraw_lib__4_4cylo()],
// 0 BFC INVERTNEXT
  [0,"BFC","INVERTNEXT"],
// 1 16 0 -4 0 4 0 0 0 8 0 0 0 4 4-4cylo.dat
  [1,16,0,-4,0,4,0,0,0,8,0,0,0,4, ldraw_lib__4_4cylo()],
// 1 16 0 -3.5 0 4 0 0 0 -0.5 0 0 0 4 4-4con1.dat
  [1,16,0,-3.5,0,4,0,0,0,-0.5,0,0,0,4, ldraw_lib__4_4con1()],
// 1 16 0 -3.5 0 4 0 0 0 1 0 0 0 4 4-4ring2.dat
  [1,16,0,-3.5,0,4,0,0,0,1,0,0,0,4, ldraw_lib__4_4ring2()],
// 0 BFC INVERTNEXT
  [0,"BFC","INVERTNEXT"],
// 1 16 0 -4 0 4 0 0 0 0.5 0 0 0 4 4-4con3.dat
  [1,16,0,-4,0,4,0,0,0,0.5,0,0,0,4, ldraw_lib__4_4con3()],
// 1 16 0 3.5 0 4 0 0 0 0.5 0 0 0 4 4-4con1.dat
  [1,16,0,3.5,0,4,0,0,0,0.5,0,0,0,4, ldraw_lib__4_4con1()],
// 1 16 0 3.5 0 4 0 0 0 -1 0 0 0 4 4-4ring2.dat
  [1,16,0,3.5,0,4,0,0,0,-1,0,0,0,4, ldraw_lib__4_4ring2()],
// 0 BFC INVERTNEXT
  [0,"BFC","INVERTNEXT"],
// 1 16 0 4 0 4 0 0 0 -0.5 0 0 0 4 4-4con3.dat
  [1,16,0,4,0,4,0,0,0,-0.5,0,0,0,4, ldraw_lib__4_4con3()],
// 5 24 -7.3912 -3.5 3.0616 -5.6568 -3.5 5.6568 -8.4852 -3.5 8.4852 -2.8284 -4 2.8284
  [5,24,-7.3912,-3.5,3.0616,-5.6568,-3.5,5.6568,-8.4852,-3.5,8.4852,-2.8284,-4,2.8284],
// 5 24 -8 -3.5 0 -7.3912 -3.5 3.0616 -3.6956 -4 1.5308 -11.0868 -3.5 4.5924
  [5,24,-8,-3.5,0,-7.3912,-3.5,3.0616,-3.6956,-4,1.5308,-11.0868,-3.5,4.5924],
// 5 24 -7.3912 -3.5 -3.0616 -8 -3.5 0 -4 -4 0 -12 -3.5 0
  [5,24,-7.3912,-3.5,-3.0616,-8,-3.5,0,-4,-4,0,-12,-3.5,0],
// 5 24 -5.6568 -3.5 -5.6568 -7.3912 -3.5 -3.0616 -3.6956 -4 -1.5308 -11.0868 -3.5 -4.5924
  [5,24,-5.6568,-3.5,-5.6568,-7.3912,-3.5,-3.0616,-3.6956,-4,-1.5308,-11.0868,-3.5,-4.5924],
// 5 24 -3.0616 -3.5 -7.3912 -5.6568 -3.5 -5.6568 -2.8284 -4 -2.8284 -8.4852 -3.5 -8.4852
  [5,24,-3.0616,-3.5,-7.3912,-5.6568,-3.5,-5.6568,-2.8284,-4,-2.8284,-8.4852,-3.5,-8.4852],
// 5 24 12 3.5 0 11.0868 3.5 4.5924 7.3912 3.5 3.0616 14.7824 4 6.1232
  [5,24,12,3.5,0,11.0868,3.5,4.5924,7.3912,3.5,3.0616,14.7824,4,6.1232],
// 5 24 4.5924 3.5 11.0868 0 3.5 12 0 4 16 0 3.5 8
  [5,24,4.5924,3.5,11.0868,0,3.5,12,0,4,16,0,3.5,8],
// 5 24 5.6568 -3.5 5.6568 7.3912 -3.5 3.0616 3.6956 -4 1.5308 11.0868 -3.5 4.5924
  [5,24,5.6568,-3.5,5.6568,7.3912,-3.5,3.0616,3.6956,-4,1.5308,11.0868,-3.5,4.5924],
// 5 24 12 -3.5 0 11.0868 -3.5 4.5924 14.7824 -4 6.1232 7.3912 -3.5 3.0616
  [5,24,12,-3.5,0,11.0868,-3.5,4.5924,14.7824,-4,6.1232,7.3912,-3.5,3.0616],
// 5 24 0 -3.5 -8 -3.0616 -3.5 -7.3912 -1.5308 -4 -3.6956 -4.5924 -3.5 -11.0868
  [5,24,0,-3.5,-8,-3.0616,-3.5,-7.3912,-1.5308,-4,-3.6956,-4.5924,-3.5,-11.0868],
// 5 24 11.0868 -3.5 -4.5924 12 -3.5 0 8 -3.5 0 16 -4 0
  [5,24,11.0868,-3.5,-4.5924,12,-3.5,0,8,-3.5,0,16,-4,0],
// 5 24 8.4852 3.5 -8.4852 11.0868 3.5 -4.5924 7.3912 3.5 -3.0616 14.7824 4 -6.1232
  [5,24,8.4852,3.5,-8.4852,11.0868,3.5,-4.5924,7.3912,3.5,-3.0616,14.7824,4,-6.1232],
// 5 24 -12 3.5 0 -11.0868 3.5 -4.5924 -14.7824 4 -6.1232 -7.3912 3.5 -3.0616
  [5,24,-12,3.5,0,-11.0868,3.5,-4.5924,-14.7824,4,-6.1232,-7.3912,3.5,-3.0616],
// 5 24 8.4852 -3.5 8.4852 4.5924 -3.5 11.0868 3.0616 -3.5 7.3912 6.1232 -4 14.7824
  [5,24,8.4852,-3.5,8.4852,4.5924,-3.5,11.0868,3.0616,-3.5,7.3912,6.1232,-4,14.7824],
// 5 24 0 3.5 -8 -3.0616 3.5 -7.3912 -1.5308 4 -3.6956 -4.5924 3.5 -11.0868
  [5,24,0,3.5,-8,-3.0616,3.5,-7.3912,-1.5308,4,-3.6956,-4.5924,3.5,-11.0868],
// 5 24 8 3.5 0 7.3912 3.5 -3.0616 3.6956 4 -1.5308 11.0868 3.5 -4.5924
  [5,24,8,3.5,0,7.3912,3.5,-3.0616,3.6956,4,-1.5308,11.0868,3.5,-4.5924],
// 5 24 -8.4852 3.5 8.4852 -11.0868 3.5 4.5924 -14.7824 4 6.1232 -7.3912 3.5 3.0616
  [5,24,-8.4852,3.5,8.4852,-11.0868,3.5,4.5924,-14.7824,4,6.1232,-7.3912,3.5,3.0616],
// 5 24 0 3.5 -12 4.5924 3.5 -11.0868 3.0616 3.5 -7.3912 6.1232 4 -14.7824
  [5,24,0,3.5,-12,4.5924,3.5,-11.0868,3.0616,3.5,-7.3912,6.1232,4,-14.7824],
// 5 24 8.4852 3.5 8.4852 4.5924 3.5 11.0868 3.0616 3.5 7.3912 6.1232 4 14.7824
  [5,24,8.4852,3.5,8.4852,4.5924,3.5,11.0868,3.0616,3.5,7.3912,6.1232,4,14.7824],
// 5 24 -4.5924 -3.5 11.0868 -8.4852 -3.5 8.4852 -5.6568 -3.5 5.6568 -11.3136 -4 11.3136
  [5,24,-4.5924,-3.5,11.0868,-8.4852,-3.5,8.4852,-5.6568,-3.5,5.6568,-11.3136,-4,11.3136],
// 5 24 -4.5924 -3.5 -11.0868 0 -3.5 -12 0 -3.5 -8 0 -4 -16
  [5,24,-4.5924,-3.5,-11.0868,0,-3.5,-12,0,-3.5,-8,0,-4,-16],
// 5 24 0 3.5 12 -4.5924 3.5 11.0868 -6.1232 4 14.7824 -3.0616 3.5 7.3912
  [5,24,0,3.5,12,-4.5924,3.5,11.0868,-6.1232,4,14.7824,-3.0616,3.5,7.3912],
// 5 24 5.6568 3.5 5.6568 7.3912 3.5 3.0616 3.6956 4 1.5308 11.0868 3.5 4.5924
  [5,24,5.6568,3.5,5.6568,7.3912,3.5,3.0616,3.6956,4,1.5308,11.0868,3.5,4.5924],
// 5 24 -3.0616 3.5 7.3912 0 3.5 8 0 4 4 0 3.5 12
  [5,24,-3.0616,3.5,7.3912,0,3.5,8,0,4,4,0,3.5,12],
// 5 24 -11.0868 3.5 -4.5924 -8.4852 3.5 -8.4852 -11.3136 4 -11.3136 -5.6568 3.5 -5.6568
  [5,24,-11.0868,3.5,-4.5924,-8.4852,3.5,-8.4852,-11.3136,4,-11.3136,-5.6568,3.5,-5.6568],
// 5 24 -3.0616 3.5 -7.3912 -5.6568 3.5 -5.6568 -2.8284 4 -2.8284 -8.4852 3.5 -8.4852
  [5,24,-3.0616,3.5,-7.3912,-5.6568,3.5,-5.6568,-2.8284,4,-2.8284,-8.4852,3.5,-8.4852],
// 5 24 -5.6568 3.5 5.6568 -3.0616 3.5 7.3912 -4.5924 3.5 11.0868 -1.5308 4 3.6956
  [5,24,-5.6568,3.5,5.6568,-3.0616,3.5,7.3912,-4.5924,3.5,11.0868,-1.5308,4,3.6956],
// 5 24 -5.6568 3.5 -5.6568 -7.3912 3.5 -3.0616 -11.0868 3.5 -4.5924 -3.6956 4 -1.5308
  [5,24,-5.6568,3.5,-5.6568,-7.3912,3.5,-3.0616,-11.0868,3.5,-4.5924,-3.6956,4,-1.5308],
// 5 24 -8.4852 3.5 -8.4852 -4.5924 3.5 -11.0868 -3.0616 3.5 -7.3912 -6.1232 4 -14.7824
  [5,24,-8.4852,3.5,-8.4852,-4.5924,3.5,-11.0868,-3.0616,3.5,-7.3912,-6.1232,4,-14.7824],
// 5 24 -11.0868 -3.5 -4.5924 -8.4852 -3.5 -8.4852 -5.6568 -3.5 -5.6568 -11.3136 -4 -11.3136
  [5,24,-11.0868,-3.5,-4.5924,-8.4852,-3.5,-8.4852,-5.6568,-3.5,-5.6568,-11.3136,-4,-11.3136],
// 5 24 3.0616 -3.5 -7.3912 0 -3.5 -8 0 -4 -4 0 -3.5 -12
  [5,24,3.0616,-3.5,-7.3912,0,-3.5,-8,0,-4,-4,0,-3.5,-12],
// 5 24 0 -3.5 8 3.0616 -3.5 7.3912 4.5924 -3.5 11.0868 1.5308 -4 3.6956
  [5,24,0,-3.5,8,3.0616,-3.5,7.3912,4.5924,-3.5,11.0868,1.5308,-4,3.6956],
// 5 24 -12 -3.5 0 -11.0868 -3.5 -4.5924 -7.3912 -3.5 -3.0616 -14.7824 -4 -6.1232
  [5,24,-12,-3.5,0,-11.0868,-3.5,-4.5924,-7.3912,-3.5,-3.0616,-14.7824,-4,-6.1232],
// 5 24 7.3912 -3.5 3.0616 8 -3.5 0 4 -4 0 12 -3.5 0
  [5,24,7.3912,-3.5,3.0616,8,-3.5,0,4,-4,0,12,-3.5,0],
// 5 24 0 -3.5 -12 4.5924 -3.5 -11.0868 6.1232 -4 -14.7824 3.0616 -3.5 -7.3912
  [5,24,0,-3.5,-12,4.5924,-3.5,-11.0868,6.1232,-4,-14.7824,3.0616,-3.5,-7.3912],
// 5 24 -8.4852 -3.5 -8.4852 -4.5924 -3.5 -11.0868 -3.0616 -3.5 -7.3912 -6.1232 -4 -14.7824
  [5,24,-8.4852,-3.5,-8.4852,-4.5924,-3.5,-11.0868,-3.0616,-3.5,-7.3912,-6.1232,-4,-14.7824],
// 5 24 5.6568 -3.5 -5.6568 3.0616 -3.5 -7.3912 1.5308 -4 -3.6956 4.5924 -3.5 -11.0868
  [5,24,5.6568,-3.5,-5.6568,3.0616,-3.5,-7.3912,1.5308,-4,-3.6956,4.5924,-3.5,-11.0868],
// 5 24 3.0616 3.5 7.3912 5.6568 3.5 5.6568 2.8284 4 2.8284 8.4852 3.5 8.4852
  [5,24,3.0616,3.5,7.3912,5.6568,3.5,5.6568,2.8284,4,2.8284,8.4852,3.5,8.4852],
// 5 24 11.0868 3.5 4.5924 8.4852 3.5 8.4852 5.6568 3.5 5.6568 11.3136 4 11.3136
  [5,24,11.0868,3.5,4.5924,8.4852,3.5,8.4852,5.6568,3.5,5.6568,11.3136,4,11.3136],
// 5 24 -3.0616 -3.5 7.3912 0 -3.5 8 0 -3.5 12 0 -4 4
  [5,24,-3.0616,-3.5,7.3912,0,-3.5,8,0,-3.5,12,0,-4,4],
// 5 24 -5.6568 -3.5 5.6568 -3.0616 -3.5 7.3912 -4.5924 -3.5 11.0868 -1.5308 -4 3.6956
  [5,24,-5.6568,-3.5,5.6568,-3.0616,-3.5,7.3912,-4.5924,-3.5,11.0868,-1.5308,-4,3.6956],
// 5 24 3.0616 -3.5 7.3912 5.6568 -3.5 5.6568 2.8284 -4 2.8284 8.4852 -3.5 8.4852
  [5,24,3.0616,-3.5,7.3912,5.6568,-3.5,5.6568,2.8284,-4,2.8284,8.4852,-3.5,8.4852],
// 5 24 5.6568 3.5 -5.6568 3.0616 3.5 -7.3912 4.5924 3.5 -11.0868 1.5308 4 -3.6956
  [5,24,5.6568,3.5,-5.6568,3.0616,3.5,-7.3912,4.5924,3.5,-11.0868,1.5308,4,-3.6956],
// 5 24 -11.0868 -3.5 4.5924 -12 -3.5 0 -8 -3.5 0 -16 -4 0
  [5,24,-11.0868,-3.5,4.5924,-12,-3.5,0,-8,-3.5,0,-16,-4,0],
// 5 24 8.4852 -3.5 -8.4852 11.0868 -3.5 -4.5924 7.3912 -3.5 -3.0616 14.7824 -4 -6.1232
  [5,24,8.4852,-3.5,-8.4852,11.0868,-3.5,-4.5924,7.3912,-3.5,-3.0616,14.7824,-4,-6.1232],
// 5 24 0 3.5 8 3.0616 3.5 7.3912 1.5308 4 3.6956 4.5924 3.5 11.0868
  [5,24,0,3.5,8,3.0616,3.5,7.3912,1.5308,4,3.6956,4.5924,3.5,11.0868],
// 5 24 -7.3912 3.5 -3.0616 -8 3.5 0 -4 4 0 -12 3.5 0
  [5,24,-7.3912,3.5,-3.0616,-8,3.5,0,-4,4,0,-12,3.5,0],
// 5 24 -8 3.5 0 -7.3912 3.5 3.0616 -3.6956 4 1.5308 -11.0868 3.5 4.5924
  [5,24,-8,3.5,0,-7.3912,3.5,3.0616,-3.6956,4,1.5308,-11.0868,3.5,4.5924],
// 5 24 7.3912 -3.5 -3.0616 5.6568 -3.5 -5.6568 2.8284 -4 -2.8284 8.4852 -3.5 -8.4852
  [5,24,7.3912,-3.5,-3.0616,5.6568,-3.5,-5.6568,2.8284,-4,-2.8284,8.4852,-3.5,-8.4852],
// 5 24 -7.3912 3.5 3.0616 -5.6568 3.5 5.6568 -2.8284 4 2.8284 -8.4852 3.5 8.4852
  [5,24,-7.3912,3.5,3.0616,-5.6568,3.5,5.6568,-2.8284,4,2.8284,-8.4852,3.5,8.4852],
// 5 24 11.0868 -3.5 4.5924 8.4852 -3.5 8.4852 5.6568 -3.5 5.6568 11.3136 -4 11.3136
  [5,24,11.0868,-3.5,4.5924,8.4852,-3.5,8.4852,5.6568,-3.5,5.6568,11.3136,-4,11.3136],
// 5 24 -4.5924 3.5 11.0868 -8.4852 3.5 8.4852 -11.3136 4 11.3136 -5.6568 3.5 5.6568
  [5,24,-4.5924,3.5,11.0868,-8.4852,3.5,8.4852,-11.3136,4,11.3136,-5.6568,3.5,5.6568],
// 5 24 3.0616 3.5 -7.3912 0 3.5 -8 0 4 -4 0 3.5 -12
  [5,24,3.0616,3.5,-7.3912,0,3.5,-8,0,4,-4,0,3.5,-12],
// 5 24 8 -3.5 0 7.3912 -3.5 -3.0616 3.6956 -4 -1.5308 11.0868 -3.5 -4.5924
  [5,24,8,-3.5,0,7.3912,-3.5,-3.0616,3.6956,-4,-1.5308,11.0868,-3.5,-4.5924],
// 5 24 4.5924 -3.5 -11.0868 8.4852 -3.5 -8.4852 5.6568 -3.5 -5.6568 11.3136 -4 -11.3136
  [5,24,4.5924,-3.5,-11.0868,8.4852,-3.5,-8.4852,5.6568,-3.5,-5.6568,11.3136,-4,-11.3136],
// 5 24 -11.0868 3.5 4.5924 -12 3.5 0 -16 4 0 -8 3.5 0
  [5,24,-11.0868,3.5,4.5924,-12,3.5,0,-16,4,0,-8,3.5,0],
// 5 24 -8.4852 -3.5 8.4852 -11.0868 -3.5 4.5924 -7.3912 -3.5 3.0616 -14.7824 -4 6.1232
  [5,24,-8.4852,-3.5,8.4852,-11.0868,-3.5,4.5924,-7.3912,-3.5,3.0616,-14.7824,-4,6.1232],
// 5 24 7.3912 3.5 -3.0616 5.6568 3.5 -5.6568 2.8284 4 -2.8284 8.4852 3.5 -8.4852
  [5,24,7.3912,3.5,-3.0616,5.6568,3.5,-5.6568,2.8284,4,-2.8284,8.4852,3.5,-8.4852],
// 5 24 4.5924 3.5 -11.0868 8.4852 3.5 -8.4852 5.6568 3.5 -5.6568 11.3136 4 -11.3136
  [5,24,4.5924,3.5,-11.0868,8.4852,3.5,-8.4852,5.6568,3.5,-5.6568,11.3136,4,-11.3136],
// 5 24 11.0868 3.5 -4.5924 12 3.5 0 8 3.5 0 16 4 0
  [5,24,11.0868,3.5,-4.5924,12,3.5,0,8,3.5,0,16,4,0],
// 5 24 0 -3.5 12 -4.5924 -3.5 11.0868 -6.1232 -4 14.7824 -3.0616 -3.5 7.3912
  [5,24,0,-3.5,12,-4.5924,-3.5,11.0868,-6.1232,-4,14.7824,-3.0616,-3.5,7.3912],
// 5 24 -4.5924 3.5 -11.0868 0 3.5 -12 0 3.5 -8 0 4 -16
  [5,24,-4.5924,3.5,-11.0868,0,3.5,-12,0,3.5,-8,0,4,-16],
// 5 24 4.5924 -3.5 11.0868 0 -3.5 12 0 -3.5 8 0 -4 16
  [5,24,4.5924,-3.5,11.0868,0,-3.5,12,0,-3.5,8,0,-4,16],
// 5 24 7.3912 3.5 3.0616 8 3.5 0 4 4 0 12 3.5 0
  [5,24,7.3912,3.5,3.0616,8,3.5,0,4,4,0,12,3.5,0],
];
module ldraw_lib__53993(step=0, col=false, unit=2/5, alt=false, line=0.2, solid=!$preview)
    makepoly(ldraw_lib__53993(), step=step, col=col, unit=unit, alt=alt, line=line, solid=solid);
ldraw_lib__53993(line=0.2);
